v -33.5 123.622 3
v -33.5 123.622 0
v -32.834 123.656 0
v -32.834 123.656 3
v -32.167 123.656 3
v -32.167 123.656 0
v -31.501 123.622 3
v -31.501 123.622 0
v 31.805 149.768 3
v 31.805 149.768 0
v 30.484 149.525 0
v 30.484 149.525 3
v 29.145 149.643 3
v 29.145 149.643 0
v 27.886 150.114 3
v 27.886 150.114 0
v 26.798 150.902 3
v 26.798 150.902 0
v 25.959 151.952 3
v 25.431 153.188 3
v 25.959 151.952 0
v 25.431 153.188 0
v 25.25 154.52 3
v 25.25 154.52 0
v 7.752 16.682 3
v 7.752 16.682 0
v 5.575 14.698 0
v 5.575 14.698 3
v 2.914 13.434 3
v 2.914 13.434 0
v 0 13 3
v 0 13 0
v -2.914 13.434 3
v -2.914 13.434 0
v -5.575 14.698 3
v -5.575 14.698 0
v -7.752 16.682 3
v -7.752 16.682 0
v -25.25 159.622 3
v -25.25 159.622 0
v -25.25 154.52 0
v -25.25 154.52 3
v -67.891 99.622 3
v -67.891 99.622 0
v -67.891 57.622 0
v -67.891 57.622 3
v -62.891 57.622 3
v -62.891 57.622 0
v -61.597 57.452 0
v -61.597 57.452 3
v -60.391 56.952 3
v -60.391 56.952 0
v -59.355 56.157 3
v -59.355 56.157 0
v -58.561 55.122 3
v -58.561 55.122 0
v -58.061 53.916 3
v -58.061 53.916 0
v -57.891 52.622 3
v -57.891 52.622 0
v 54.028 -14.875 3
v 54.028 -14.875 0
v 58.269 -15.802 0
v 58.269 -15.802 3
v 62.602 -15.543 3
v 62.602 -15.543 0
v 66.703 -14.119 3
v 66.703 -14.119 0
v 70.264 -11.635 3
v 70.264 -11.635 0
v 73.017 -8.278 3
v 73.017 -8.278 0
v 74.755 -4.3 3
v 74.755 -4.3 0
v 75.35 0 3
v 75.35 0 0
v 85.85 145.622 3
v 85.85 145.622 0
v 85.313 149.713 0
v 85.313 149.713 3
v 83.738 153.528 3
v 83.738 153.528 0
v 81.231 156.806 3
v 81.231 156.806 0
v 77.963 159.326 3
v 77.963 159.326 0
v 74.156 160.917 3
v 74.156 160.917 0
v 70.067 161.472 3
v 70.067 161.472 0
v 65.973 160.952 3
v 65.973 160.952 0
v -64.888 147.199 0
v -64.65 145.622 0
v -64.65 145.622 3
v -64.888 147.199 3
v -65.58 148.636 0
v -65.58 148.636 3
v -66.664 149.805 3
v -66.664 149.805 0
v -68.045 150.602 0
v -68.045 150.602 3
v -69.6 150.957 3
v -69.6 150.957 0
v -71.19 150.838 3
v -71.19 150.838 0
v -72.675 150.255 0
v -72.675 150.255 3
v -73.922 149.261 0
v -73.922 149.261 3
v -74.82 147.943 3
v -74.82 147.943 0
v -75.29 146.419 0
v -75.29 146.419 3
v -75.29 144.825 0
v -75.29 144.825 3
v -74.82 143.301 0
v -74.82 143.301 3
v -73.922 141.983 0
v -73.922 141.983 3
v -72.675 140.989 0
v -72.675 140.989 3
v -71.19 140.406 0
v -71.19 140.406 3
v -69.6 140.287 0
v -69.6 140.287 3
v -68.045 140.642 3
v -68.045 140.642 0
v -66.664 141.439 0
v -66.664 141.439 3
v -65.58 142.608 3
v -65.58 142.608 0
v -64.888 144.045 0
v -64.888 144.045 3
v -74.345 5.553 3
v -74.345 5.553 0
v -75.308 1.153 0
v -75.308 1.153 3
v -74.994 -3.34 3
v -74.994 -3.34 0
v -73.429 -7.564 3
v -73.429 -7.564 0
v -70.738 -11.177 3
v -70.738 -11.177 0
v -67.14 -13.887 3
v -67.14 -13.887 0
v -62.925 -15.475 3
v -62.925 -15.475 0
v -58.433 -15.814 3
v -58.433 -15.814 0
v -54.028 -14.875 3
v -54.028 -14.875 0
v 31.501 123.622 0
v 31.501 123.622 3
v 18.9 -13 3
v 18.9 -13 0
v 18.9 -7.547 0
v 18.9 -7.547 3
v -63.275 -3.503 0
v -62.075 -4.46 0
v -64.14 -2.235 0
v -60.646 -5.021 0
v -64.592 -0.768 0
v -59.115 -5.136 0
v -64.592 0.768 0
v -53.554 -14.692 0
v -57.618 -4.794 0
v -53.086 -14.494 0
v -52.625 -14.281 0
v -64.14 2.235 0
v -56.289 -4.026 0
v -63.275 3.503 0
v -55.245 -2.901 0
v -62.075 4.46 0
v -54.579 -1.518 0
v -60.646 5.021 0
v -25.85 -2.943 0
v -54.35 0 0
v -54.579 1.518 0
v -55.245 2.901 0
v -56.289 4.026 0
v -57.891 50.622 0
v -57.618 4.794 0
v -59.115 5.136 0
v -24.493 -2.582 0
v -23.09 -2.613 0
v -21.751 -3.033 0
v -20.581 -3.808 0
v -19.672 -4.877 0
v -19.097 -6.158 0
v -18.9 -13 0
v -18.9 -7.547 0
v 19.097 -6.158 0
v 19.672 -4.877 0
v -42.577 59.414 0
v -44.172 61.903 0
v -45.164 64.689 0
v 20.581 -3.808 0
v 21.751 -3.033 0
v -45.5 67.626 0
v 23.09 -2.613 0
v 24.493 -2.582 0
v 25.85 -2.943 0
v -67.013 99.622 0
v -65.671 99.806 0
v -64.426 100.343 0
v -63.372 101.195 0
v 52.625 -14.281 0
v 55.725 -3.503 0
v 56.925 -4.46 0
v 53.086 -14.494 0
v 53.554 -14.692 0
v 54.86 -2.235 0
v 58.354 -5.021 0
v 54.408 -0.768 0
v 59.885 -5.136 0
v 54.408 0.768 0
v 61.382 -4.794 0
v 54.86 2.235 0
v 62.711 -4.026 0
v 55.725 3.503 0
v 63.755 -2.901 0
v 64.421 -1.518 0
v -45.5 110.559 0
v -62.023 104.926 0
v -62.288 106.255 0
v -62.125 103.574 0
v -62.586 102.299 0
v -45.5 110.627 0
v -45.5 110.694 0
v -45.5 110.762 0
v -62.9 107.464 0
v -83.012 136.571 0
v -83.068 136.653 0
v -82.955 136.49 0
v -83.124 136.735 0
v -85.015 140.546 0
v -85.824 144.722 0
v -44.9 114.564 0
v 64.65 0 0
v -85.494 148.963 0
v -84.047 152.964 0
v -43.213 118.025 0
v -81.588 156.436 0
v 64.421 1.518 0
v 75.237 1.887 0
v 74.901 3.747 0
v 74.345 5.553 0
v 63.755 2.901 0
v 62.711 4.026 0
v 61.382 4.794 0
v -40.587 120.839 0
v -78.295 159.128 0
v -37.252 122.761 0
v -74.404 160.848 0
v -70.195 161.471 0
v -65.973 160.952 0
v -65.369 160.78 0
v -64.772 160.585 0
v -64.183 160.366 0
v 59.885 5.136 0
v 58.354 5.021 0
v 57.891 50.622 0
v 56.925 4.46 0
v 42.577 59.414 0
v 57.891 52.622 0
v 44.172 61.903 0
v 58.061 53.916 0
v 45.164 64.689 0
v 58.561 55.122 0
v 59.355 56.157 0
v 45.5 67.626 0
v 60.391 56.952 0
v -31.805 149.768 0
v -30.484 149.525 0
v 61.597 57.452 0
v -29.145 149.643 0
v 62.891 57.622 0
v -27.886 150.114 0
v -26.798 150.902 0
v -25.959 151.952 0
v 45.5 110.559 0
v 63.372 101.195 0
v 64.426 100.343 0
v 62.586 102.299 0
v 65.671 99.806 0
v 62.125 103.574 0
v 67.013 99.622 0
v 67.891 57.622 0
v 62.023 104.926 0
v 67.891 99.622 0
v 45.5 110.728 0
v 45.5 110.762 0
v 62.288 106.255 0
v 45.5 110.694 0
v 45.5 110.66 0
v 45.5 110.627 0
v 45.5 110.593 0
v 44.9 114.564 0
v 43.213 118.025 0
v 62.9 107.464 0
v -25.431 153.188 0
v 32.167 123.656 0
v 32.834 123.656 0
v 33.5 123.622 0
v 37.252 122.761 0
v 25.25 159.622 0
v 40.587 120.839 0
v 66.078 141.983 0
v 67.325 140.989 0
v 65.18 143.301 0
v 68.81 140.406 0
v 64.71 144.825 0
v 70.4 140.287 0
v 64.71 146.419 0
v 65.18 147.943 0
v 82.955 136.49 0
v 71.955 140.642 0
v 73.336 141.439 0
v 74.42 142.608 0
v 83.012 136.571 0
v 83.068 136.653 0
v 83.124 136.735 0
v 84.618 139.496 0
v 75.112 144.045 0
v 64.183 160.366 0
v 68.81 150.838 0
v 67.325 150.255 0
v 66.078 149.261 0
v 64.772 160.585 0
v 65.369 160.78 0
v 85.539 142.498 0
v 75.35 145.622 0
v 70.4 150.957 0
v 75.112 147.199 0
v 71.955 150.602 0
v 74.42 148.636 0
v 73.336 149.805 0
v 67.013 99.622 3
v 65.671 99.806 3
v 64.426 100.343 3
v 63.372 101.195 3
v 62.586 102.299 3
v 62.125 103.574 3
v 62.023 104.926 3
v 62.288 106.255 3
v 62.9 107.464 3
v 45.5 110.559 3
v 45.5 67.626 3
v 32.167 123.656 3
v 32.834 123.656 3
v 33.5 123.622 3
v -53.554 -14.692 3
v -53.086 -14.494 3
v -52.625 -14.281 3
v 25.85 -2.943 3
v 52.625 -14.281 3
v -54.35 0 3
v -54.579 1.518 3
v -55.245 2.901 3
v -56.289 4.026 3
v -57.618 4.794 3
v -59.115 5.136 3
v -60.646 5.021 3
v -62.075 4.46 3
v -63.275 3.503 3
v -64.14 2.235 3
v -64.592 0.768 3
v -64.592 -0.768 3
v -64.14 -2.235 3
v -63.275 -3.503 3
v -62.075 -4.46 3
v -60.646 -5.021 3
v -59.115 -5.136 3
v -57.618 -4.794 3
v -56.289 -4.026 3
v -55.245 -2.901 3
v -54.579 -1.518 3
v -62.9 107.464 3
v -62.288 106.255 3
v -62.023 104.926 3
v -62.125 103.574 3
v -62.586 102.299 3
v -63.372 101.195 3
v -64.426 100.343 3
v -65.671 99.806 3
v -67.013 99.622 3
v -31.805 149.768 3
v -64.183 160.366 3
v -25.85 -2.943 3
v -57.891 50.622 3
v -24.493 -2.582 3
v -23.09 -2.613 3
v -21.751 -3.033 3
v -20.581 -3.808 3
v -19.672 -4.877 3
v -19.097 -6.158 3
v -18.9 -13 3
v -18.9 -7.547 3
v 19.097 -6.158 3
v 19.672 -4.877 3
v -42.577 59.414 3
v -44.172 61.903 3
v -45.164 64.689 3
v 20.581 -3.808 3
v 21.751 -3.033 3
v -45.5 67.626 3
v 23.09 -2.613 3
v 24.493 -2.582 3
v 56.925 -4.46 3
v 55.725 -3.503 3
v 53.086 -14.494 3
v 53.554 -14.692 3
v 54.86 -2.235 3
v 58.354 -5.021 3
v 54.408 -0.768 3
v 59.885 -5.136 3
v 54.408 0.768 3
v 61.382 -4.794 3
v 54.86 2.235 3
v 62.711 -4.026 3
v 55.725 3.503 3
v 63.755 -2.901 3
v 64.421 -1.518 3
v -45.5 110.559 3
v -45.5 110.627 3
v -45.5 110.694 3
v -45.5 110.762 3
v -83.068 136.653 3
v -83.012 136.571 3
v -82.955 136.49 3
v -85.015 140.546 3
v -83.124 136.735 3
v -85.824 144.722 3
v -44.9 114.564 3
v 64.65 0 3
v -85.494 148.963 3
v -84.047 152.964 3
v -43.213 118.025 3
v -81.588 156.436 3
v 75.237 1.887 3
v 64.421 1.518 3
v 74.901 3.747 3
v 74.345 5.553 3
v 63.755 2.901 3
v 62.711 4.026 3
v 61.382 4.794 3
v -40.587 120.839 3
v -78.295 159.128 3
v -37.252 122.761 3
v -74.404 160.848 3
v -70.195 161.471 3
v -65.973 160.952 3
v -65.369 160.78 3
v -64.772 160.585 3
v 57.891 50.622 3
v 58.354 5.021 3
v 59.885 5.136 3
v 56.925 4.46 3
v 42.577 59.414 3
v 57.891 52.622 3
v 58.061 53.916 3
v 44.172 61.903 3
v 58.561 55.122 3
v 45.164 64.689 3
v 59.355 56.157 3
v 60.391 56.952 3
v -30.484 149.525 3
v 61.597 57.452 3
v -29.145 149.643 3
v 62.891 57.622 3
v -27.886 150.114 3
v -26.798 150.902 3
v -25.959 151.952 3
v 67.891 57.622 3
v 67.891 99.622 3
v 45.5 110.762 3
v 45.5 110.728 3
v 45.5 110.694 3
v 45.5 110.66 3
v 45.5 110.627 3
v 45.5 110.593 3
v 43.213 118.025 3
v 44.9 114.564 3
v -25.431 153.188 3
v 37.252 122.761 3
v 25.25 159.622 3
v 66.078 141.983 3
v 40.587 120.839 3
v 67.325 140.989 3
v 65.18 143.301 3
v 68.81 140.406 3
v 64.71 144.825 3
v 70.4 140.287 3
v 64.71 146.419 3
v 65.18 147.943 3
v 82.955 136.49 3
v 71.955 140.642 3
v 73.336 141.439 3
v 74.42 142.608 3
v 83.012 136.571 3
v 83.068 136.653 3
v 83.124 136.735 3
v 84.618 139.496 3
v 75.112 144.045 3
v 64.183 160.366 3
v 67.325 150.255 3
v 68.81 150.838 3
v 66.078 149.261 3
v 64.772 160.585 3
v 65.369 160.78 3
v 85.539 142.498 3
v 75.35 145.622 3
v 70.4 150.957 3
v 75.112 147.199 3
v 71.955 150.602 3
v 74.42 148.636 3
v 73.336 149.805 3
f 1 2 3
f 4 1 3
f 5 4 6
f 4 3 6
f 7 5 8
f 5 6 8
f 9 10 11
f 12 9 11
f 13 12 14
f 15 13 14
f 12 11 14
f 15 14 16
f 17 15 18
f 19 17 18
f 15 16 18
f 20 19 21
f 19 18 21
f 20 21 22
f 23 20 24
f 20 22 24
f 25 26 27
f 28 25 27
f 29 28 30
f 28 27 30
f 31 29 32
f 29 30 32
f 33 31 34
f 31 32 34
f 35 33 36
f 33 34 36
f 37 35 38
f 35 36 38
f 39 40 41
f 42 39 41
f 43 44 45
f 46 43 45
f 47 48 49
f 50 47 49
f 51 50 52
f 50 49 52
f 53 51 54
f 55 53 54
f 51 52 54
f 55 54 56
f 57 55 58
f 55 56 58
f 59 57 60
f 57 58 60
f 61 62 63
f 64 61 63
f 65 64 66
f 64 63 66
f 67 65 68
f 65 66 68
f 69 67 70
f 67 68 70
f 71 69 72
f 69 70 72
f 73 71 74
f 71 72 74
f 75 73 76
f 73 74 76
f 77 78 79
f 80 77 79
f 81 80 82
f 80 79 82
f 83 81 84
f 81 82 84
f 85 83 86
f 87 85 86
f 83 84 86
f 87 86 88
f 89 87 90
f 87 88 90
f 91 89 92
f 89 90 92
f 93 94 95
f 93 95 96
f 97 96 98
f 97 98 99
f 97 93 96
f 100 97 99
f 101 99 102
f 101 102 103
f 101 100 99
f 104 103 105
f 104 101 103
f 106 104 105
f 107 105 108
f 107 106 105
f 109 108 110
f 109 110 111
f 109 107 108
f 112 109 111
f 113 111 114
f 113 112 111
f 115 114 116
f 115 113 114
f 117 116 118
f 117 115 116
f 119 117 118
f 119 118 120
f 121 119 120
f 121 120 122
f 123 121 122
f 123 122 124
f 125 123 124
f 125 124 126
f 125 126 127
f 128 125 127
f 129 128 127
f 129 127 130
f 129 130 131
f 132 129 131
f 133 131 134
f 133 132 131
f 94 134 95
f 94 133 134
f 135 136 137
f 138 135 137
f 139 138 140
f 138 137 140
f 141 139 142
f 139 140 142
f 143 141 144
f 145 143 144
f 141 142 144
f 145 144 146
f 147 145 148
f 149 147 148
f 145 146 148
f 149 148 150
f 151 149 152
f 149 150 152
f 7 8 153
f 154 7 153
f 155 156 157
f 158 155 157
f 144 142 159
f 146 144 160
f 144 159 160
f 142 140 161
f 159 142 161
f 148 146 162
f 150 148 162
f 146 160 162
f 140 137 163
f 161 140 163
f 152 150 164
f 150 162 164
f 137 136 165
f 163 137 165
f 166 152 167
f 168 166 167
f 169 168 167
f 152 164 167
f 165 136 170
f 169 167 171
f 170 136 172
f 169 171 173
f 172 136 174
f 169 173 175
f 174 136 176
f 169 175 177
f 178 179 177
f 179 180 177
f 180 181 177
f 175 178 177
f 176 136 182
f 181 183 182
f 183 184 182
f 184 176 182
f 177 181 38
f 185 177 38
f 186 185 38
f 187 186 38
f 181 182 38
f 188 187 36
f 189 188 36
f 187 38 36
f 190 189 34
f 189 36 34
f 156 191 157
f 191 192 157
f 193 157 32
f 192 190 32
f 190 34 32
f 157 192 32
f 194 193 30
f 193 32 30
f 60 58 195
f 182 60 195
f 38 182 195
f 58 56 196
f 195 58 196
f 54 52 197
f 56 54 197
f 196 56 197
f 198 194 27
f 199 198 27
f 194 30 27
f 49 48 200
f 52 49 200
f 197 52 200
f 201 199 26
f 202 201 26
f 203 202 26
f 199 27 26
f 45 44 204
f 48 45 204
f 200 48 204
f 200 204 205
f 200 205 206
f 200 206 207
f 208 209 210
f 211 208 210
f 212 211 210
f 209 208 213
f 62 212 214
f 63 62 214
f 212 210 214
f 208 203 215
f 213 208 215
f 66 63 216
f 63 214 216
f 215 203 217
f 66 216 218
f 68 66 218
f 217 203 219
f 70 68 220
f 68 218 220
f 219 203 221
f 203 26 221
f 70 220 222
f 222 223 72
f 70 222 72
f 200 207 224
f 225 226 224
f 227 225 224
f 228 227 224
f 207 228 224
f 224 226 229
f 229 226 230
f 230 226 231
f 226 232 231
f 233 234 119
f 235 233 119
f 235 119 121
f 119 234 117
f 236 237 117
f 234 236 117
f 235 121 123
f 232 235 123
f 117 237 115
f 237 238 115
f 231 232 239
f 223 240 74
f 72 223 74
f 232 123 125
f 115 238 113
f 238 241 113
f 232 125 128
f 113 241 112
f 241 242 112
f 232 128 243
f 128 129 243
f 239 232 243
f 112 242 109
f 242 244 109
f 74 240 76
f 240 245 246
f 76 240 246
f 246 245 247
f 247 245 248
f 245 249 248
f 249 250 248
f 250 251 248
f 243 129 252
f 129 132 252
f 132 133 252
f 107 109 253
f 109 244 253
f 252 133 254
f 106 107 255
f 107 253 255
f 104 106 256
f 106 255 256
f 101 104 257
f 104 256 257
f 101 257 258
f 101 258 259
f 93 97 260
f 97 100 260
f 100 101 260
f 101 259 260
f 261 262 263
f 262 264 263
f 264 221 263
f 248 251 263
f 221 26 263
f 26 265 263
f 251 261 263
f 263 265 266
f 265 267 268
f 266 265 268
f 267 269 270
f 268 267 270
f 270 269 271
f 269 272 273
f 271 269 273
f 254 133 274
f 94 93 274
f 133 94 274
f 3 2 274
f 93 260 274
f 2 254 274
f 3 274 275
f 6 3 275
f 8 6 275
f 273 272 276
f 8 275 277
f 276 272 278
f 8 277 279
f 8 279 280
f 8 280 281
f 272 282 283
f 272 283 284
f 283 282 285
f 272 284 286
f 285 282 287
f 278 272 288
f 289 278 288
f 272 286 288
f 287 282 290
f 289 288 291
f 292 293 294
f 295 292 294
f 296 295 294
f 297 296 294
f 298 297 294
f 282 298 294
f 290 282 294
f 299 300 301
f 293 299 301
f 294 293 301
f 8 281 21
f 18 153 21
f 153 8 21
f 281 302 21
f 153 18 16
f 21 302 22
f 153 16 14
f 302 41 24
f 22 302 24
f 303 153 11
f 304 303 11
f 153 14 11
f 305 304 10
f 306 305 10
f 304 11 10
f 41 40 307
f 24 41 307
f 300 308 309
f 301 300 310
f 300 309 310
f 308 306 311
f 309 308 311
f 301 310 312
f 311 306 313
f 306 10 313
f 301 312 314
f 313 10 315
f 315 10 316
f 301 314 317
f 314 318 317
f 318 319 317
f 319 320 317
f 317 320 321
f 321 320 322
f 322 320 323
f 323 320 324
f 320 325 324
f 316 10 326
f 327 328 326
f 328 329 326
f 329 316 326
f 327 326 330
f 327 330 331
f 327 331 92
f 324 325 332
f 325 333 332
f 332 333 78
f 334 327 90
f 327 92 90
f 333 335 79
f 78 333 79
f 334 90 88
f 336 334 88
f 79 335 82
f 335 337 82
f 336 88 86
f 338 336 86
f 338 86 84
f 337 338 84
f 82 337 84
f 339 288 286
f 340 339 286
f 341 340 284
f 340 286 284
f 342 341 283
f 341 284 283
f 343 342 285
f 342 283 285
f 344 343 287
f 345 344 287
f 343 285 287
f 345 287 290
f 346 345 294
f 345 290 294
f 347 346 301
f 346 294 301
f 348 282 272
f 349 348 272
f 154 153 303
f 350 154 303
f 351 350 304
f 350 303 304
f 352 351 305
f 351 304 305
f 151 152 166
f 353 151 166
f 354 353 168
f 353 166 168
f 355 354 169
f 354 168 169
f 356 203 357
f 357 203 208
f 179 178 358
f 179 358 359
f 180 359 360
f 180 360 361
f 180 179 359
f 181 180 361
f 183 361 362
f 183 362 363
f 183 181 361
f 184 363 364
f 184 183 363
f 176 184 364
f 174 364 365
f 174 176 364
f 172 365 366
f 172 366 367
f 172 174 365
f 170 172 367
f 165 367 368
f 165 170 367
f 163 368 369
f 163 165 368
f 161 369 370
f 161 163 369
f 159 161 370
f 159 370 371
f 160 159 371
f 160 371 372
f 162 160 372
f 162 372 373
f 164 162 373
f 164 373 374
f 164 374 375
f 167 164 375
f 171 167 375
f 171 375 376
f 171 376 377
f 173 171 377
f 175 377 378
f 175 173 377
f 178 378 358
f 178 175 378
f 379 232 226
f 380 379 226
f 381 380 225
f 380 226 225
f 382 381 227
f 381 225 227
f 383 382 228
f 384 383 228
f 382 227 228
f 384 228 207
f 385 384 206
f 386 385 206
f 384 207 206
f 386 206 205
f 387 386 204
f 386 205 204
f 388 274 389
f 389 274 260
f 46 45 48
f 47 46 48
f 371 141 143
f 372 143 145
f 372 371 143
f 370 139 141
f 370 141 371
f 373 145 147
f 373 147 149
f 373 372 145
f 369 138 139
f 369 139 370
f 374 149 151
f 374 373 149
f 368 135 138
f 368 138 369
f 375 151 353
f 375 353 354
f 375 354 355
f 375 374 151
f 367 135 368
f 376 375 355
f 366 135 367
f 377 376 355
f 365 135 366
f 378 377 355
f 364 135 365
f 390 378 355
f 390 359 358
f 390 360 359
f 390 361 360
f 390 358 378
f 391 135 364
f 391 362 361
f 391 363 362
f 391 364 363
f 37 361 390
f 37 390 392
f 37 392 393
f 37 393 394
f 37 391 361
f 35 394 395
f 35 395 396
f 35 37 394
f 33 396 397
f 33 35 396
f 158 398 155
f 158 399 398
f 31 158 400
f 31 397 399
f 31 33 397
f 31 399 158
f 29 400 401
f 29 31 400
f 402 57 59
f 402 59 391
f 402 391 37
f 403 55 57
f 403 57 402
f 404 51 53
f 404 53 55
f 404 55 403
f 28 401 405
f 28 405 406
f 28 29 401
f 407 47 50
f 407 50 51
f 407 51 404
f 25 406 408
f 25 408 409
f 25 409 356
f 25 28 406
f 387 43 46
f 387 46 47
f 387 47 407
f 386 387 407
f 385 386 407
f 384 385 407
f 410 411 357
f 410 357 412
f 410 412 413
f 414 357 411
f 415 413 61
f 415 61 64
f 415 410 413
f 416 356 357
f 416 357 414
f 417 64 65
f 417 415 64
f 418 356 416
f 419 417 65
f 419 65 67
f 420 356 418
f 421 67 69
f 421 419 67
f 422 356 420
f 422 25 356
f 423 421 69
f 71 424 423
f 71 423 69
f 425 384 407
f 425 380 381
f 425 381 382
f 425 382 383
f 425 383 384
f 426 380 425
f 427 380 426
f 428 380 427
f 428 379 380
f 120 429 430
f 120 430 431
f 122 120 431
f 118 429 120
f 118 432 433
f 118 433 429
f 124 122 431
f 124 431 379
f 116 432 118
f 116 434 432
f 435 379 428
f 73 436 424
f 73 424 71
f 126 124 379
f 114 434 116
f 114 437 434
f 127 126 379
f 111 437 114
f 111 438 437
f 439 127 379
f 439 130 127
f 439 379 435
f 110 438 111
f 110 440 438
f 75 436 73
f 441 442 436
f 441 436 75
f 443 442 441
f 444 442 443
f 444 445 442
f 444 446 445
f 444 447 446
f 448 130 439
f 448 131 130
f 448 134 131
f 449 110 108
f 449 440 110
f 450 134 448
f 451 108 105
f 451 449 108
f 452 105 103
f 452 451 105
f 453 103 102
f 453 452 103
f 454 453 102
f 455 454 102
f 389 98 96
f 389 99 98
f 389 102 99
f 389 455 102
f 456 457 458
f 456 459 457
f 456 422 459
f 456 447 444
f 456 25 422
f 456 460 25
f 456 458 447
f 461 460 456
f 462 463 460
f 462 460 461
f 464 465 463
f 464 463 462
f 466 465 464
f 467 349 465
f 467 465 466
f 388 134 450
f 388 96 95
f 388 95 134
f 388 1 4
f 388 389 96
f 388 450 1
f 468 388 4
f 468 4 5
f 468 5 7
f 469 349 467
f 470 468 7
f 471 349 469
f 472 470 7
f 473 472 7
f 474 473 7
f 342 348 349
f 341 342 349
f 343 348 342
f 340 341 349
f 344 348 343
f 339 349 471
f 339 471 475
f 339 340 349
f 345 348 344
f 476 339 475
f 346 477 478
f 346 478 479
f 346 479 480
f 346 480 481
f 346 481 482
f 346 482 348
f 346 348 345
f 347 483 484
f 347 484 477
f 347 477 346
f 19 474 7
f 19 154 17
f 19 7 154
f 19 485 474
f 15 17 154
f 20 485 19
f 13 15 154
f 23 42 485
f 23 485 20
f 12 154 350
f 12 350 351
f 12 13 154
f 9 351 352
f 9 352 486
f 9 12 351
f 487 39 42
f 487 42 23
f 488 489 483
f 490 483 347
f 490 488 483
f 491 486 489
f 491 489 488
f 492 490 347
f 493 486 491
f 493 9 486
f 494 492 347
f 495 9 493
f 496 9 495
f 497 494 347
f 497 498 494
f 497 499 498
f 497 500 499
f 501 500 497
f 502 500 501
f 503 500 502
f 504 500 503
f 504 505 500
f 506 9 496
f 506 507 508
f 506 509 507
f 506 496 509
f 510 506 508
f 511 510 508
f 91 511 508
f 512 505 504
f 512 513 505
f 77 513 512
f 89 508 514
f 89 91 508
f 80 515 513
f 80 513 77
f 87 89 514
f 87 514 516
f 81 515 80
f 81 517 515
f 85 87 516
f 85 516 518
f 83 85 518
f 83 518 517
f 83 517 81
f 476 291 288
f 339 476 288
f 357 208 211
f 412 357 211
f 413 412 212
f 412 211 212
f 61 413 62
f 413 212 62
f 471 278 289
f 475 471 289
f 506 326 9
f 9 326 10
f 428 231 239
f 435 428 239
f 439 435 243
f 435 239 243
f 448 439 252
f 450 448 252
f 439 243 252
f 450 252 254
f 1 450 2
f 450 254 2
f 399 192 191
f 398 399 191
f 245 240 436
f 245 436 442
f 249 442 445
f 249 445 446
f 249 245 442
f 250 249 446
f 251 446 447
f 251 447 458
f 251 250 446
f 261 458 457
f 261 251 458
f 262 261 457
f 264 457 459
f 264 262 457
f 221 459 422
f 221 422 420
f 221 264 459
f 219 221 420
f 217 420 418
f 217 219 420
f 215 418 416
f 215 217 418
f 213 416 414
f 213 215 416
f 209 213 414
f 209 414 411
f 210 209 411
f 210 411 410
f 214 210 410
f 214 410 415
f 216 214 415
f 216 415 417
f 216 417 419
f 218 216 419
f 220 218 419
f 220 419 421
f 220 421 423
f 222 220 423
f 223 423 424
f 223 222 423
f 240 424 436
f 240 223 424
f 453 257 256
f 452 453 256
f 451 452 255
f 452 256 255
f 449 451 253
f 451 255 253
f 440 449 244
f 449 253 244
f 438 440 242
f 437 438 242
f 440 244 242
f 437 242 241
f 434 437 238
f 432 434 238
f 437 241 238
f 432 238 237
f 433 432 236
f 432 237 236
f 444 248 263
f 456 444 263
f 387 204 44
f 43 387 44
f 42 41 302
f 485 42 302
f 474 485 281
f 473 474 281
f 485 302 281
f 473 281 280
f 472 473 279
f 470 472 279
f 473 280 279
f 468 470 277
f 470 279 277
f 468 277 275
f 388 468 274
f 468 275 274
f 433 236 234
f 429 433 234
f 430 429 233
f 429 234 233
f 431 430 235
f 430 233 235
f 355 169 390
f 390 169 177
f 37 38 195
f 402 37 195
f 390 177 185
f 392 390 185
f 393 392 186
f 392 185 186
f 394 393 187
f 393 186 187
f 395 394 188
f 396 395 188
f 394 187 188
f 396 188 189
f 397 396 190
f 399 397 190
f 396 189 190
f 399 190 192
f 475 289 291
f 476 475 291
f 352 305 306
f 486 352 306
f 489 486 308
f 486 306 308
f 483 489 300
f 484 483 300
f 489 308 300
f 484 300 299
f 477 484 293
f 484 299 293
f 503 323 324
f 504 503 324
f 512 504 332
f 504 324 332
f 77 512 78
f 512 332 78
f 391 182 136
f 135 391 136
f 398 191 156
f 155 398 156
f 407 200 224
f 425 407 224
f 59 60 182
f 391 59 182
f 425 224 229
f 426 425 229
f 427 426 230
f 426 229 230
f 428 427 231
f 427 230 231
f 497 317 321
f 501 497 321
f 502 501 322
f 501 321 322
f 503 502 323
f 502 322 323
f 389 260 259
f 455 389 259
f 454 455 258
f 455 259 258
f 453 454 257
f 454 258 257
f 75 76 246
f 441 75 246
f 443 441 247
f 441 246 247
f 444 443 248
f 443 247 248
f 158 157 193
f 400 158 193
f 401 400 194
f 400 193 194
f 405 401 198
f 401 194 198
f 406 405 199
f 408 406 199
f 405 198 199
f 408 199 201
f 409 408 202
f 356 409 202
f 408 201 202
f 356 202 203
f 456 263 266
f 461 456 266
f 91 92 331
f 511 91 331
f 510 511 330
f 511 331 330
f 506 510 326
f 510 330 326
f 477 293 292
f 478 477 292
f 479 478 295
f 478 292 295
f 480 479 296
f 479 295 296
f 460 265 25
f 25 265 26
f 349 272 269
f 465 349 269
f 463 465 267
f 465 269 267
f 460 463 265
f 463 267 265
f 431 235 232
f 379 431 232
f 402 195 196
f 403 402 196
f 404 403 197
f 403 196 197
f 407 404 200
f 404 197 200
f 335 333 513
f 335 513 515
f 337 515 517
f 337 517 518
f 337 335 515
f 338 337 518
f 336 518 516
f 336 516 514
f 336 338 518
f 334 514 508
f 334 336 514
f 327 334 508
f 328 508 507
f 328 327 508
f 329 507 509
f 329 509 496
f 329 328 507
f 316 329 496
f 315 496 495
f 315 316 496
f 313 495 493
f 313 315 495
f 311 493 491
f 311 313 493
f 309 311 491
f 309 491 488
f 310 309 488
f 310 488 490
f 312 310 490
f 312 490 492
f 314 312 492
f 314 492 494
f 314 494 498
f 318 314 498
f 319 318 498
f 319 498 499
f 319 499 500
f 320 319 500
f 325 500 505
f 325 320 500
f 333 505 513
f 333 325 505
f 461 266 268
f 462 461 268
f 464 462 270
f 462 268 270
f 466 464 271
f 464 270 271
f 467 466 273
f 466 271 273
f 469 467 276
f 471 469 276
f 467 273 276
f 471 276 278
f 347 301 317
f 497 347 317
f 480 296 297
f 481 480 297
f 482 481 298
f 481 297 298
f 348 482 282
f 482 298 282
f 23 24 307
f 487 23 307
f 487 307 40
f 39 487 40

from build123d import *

# Parameters (mm, degrees)
F0_R     = 5.15
F0_R_2   = 5.35
F1_DEPTH = 3


with BuildPart() as f1:
    # F0 (on Top) → F1 (new body)
    with BuildSketch(Plane.XY):
        with BuildLine():
            Line((-18.9, -13), (0, -13))
            Line((0, -13), (18.9, -13))
            Line((18.9, -13), (18.9, -7.5471567511))
            ThreePointArc((18.9, -7.5471567511), (21.1385310794, -3.3789089897), (25.8497157602, -2.9429620925))
            Line((25.8497157602, -2.9429620925), (52.6252323996, -14.2814589745))
            ThreePointArc((52.6252323996, -14.2814589745), (48.8117732228, 11.7040295779), (74.3452534861, 5.5534627876))
            Line((74.3452534861, 5.5534627876), (57.8907951768, 50.621942028))
            Line((57.8907951768, 50.621942028), (57.8907951768, 52.621942028))
            ThreePointArc((57.8907951768, 52.621942028), (59.3552612709, 56.1574759339), (62.8907951768, 57.621942028))
            Line((62.8907951768, 57.621942028), (67.8907951768, 57.621942028))
            Line((67.8907951768, 57.621942028), (67.8907951768, 99.621942028))
            Line((67.8907951768, 99.621942028), (67.0134539994, 99.621942028))
            ThreePointArc((67.0134539994, 99.621942028), (62.5856321018, 102.2993587156), (62.8998598996, 107.4641847308))
            Line((62.8998598996, 107.4641847308), (82.9549976553, 136.4901001683))
            ThreePointArc((82.9549976553, 136.4901001683), (57.5400115252, 135.8254535138), (64.1829778441, 160.3659154829))
            Line((64.1829778441, 160.3659154829), (31.8054457349, 149.7677431215))
            ThreePointArc((31.8054457349, 149.7677431215), (27.315483743, 150.4713614419), (25.25, 154.5196467995))
            Line((25.25, 154.5196467995), (25.25, 159.621942028))
            Line((25.25, 159.621942028), (0, 159.621942028))
            Line((0, 159.621942028), (-25.25, 159.621942028))
            Line((-25.25, 159.621942028), (-25.25, 154.5196467995))
            ThreePointArc((-25.25, 154.5196467995), (-27.315483743, 150.4713614419), (-31.8054457349, 149.7677431215))
            Line((-31.8054457349, 149.7677431215), (-64.1829778441, 160.3659154829))
            ThreePointArc((-64.1829778441, 160.3659154829), (-56.8961398594, 154.5388556989), (-54.15, 145.621942028))
            ThreePointArc((-54.15, 145.621942028), (-65.2101259326, 130.5130173006), (-82.9549976553, 136.4901001683))
            Line((-82.9549976553, 136.4901001683), (-62.8998598996, 107.4641847308))
            ThreePointArc((-62.8998598996, 107.4641847308), (-62.5856321018, 102.2993587156), (-67.0134539994, 99.621942028))
            Line((-67.0134539994, 99.621942028), (-67.8907951768, 99.621942028))
            Line((-67.8907951768, 99.621942028), (-67.8907951768, 57.621942028))
            Line((-67.8907951768, 57.621942028), (-62.8907951768, 57.621942028))
            ThreePointArc((-62.8907951768, 57.621942028), (-59.3552612709, 56.1574759339), (-57.8907951768, 52.621942028))
            Line((-57.8907951768, 52.621942028), (-57.8907951768, 50.621942028))
            Line((-57.8907951768, 50.621942028), (-74.3452534861, 5.5534627876))
            ThreePointArc((-74.3452534861, 5.5534627876), (-56.6781892121, 15.5967908198), (-43.65, 0))
            ThreePointArc((-43.65, 0), (-46.0800974954, -8.4337842495), (-52.6252323996, -14.2814589745))
            Line((-52.6252323996, -14.2814589745), (-25.8497157602, -2.9429620925))
            ThreePointArc((-25.8497157602, -2.9429620925), (-21.1385310794, -3.3789089897), (-18.9, -7.5471567511))
            Line((-18.9, -7.5471567511), (-18.9, -13))
        make_face()
        with BuildLine():
            Line((-31.5007925391, 123.621942028), (0, 123.621942028))
            Line((0, 123.621942028), (31.5007925391, 123.621942028))
            ThreePointArc((31.5007925391, 123.621942028), (32.5003962696, 123.6604300644), (33.5, 123.621942028))
            ThreePointArc((33.5, 123.621942028), (42.0051009072, 119.5295106115), (45.5, 110.7619330287))
            ThreePointArc((45.5, 110.7619330287), (45.5002972018, 110.7111819333), (45.5003962696, 110.6604300644))
            ThreePointArc((45.5003962696, 110.6604300644), (45.5002972018, 110.6096781955), (45.5, 110.5589271001))
            Line((45.5, 110.5589271001), (45.5, 67.6264936436))
            ThreePointArc((45.5, 67.6264936436), (44.7475202166, 63.2677956104), (42.5771925315, 59.413687139))
            Line((42.5771925315, 59.413687139), (7.7516868511, 16.6824568887))
            Line((7.7516868511, 16.6824568887), (0, 7.1710626049))
            Line((0, 7.1710626049), (-7.7516866199, 16.6824566051))
            Line((-7.7516866199, 16.6824566051), (-42.5771925315, 59.413687139))
            ThreePointArc((-42.5771925315, 59.413687139), (-44.7475202166, 63.2677956104), (-45.5, 67.6264936436))
            Line((-45.5, 67.6264936436), (-45.5, 110.5589271001))
            ThreePointArc((-45.5, 110.5589271001), (-45.5003962696, 110.6604300644), (-45.5, 110.7619330287))
            ThreePointArc((-45.5, 110.7619330287), (-42.0051009072, 119.5295106115), (-33.5, 123.621942028))
            ThreePointArc((-33.5, 123.621942028), (-32.5003962696, 123.6604300644), (-31.5007925391, 123.621942028))
        make_face(mode=Mode.SUBTRACT)
        with BuildLine():
            ThreePointArc((74.3452534861, 5.5534627876), (48.8117732228, 11.7040295779), (52.6252323996, -14.2814589745))
            Line((52.6252323996, -14.2814589745), (54.0278478598, -14.8754176733))
            Line((54.0278478598, -14.8754176733), (74.3452534861, 5.5534627876))
        make_face()
        with Locations((59.5, 0)):
            Circle(F0_R, mode=Mode.SUBTRACT)
        with BuildLine():
            Line((54.0278478598, -14.8754176733), (52.6252323996, -14.2814589745))
            ThreePointArc((52.6252323996, -14.2814589745), (53.31940104, -14.5952970678), (54.0278478598, -14.8754176733))
        make_face()
        with BuildLine():
            Line((-54.0278478598, -14.8754176733), (-52.6252323996, -14.2814589745))
            ThreePointArc((-52.6252323996, -14.2814589745), (-46.0800974954, -8.4337842495), (-43.65, 0))
            ThreePointArc((-43.65, 0), (-56.6781892121, 15.5967908198), (-74.3452534861, 5.5534627876))
            Line((-74.3452534861, 5.5534627876), (-54.0278478598, -14.8754176733))
        make_face()
        with Locations((-59.5, 0)):
            Circle(F0_R, mode=Mode.SUBTRACT)
        with BuildLine():
            ThreePointArc((-54.0278478598, -14.8754176733), (-53.31940104, -14.5952970678), (-52.6252323996, -14.2814589745))
            Line((-52.6252323996, -14.2814589745), (-54.0278478598, -14.8754176733))
        make_face()
        with BuildLine():
            Line((74.3452534861, 5.5534627876), (54.0278478598, -14.8754176733))
            ThreePointArc((54.0278478598, -14.8754176733), (68.5688722722, -12.9991559615), (75.35, 0))
            ThreePointArc((75.35, 0), (75.0967908198, 2.8218107879), (74.3452534861, 5.5534627876))
        make_face()
        with BuildLine():
            ThreePointArc((-74.3452534861, 5.5534627876), (-70.7382626073, -11.1769384703), (-54.0278478598, -14.8754176733))
            Line((-54.0278478598, -14.8754176733), (-74.3452534861, 5.5534627876))
        make_face()
        with BuildLine():
            ThreePointArc((64.1829778441, 160.3659154829), (57.5400115252, 135.8254535138), (82.9549976553, 136.4901001683))
            Line((82.9549976553, 136.4901001683), (83.1240413462, 136.7347580678))
            Line((83.1240413462, 136.7347580678), (65.9729166922, 160.9518180885))
            Line((65.9729166922, 160.9518180885), (64.1829778441, 160.3659154829))
        make_face()
        with Locations((70, 145.621942028)):
            Circle(F0_R_2, mode=Mode.SUBTRACT)
        with BuildLine():
            Line((83.1240413462, 136.7347580678), (82.9549976553, 136.4901001683))
            ThreePointArc((82.9549976553, 136.4901001683), (83.0400932966, 136.6120326601), (83.1240413462, 136.7347580678))
        make_face()
        with BuildLine():
            Line((65.9729166922, 160.9518180885), (83.1240413462, 136.7347580678))
            ThreePointArc((83.1240413462, 136.7347580678), (85.1531936459, 140.9740153578), (85.85, 145.621942028))
            ThreePointArc((85.85, 145.621942028), (79.6797011724, 158.1728736752), (65.9729166922, 160.9518180885))
        make_face()
        with BuildLine():
            ThreePointArc((65.9729166922, 160.9518180885), (65.0692370204, 160.6854766875), (64.1829778441, 160.3659154829))
            Line((64.1829778441, 160.3659154829), (65.9729166922, 160.9518180885))
        make_face()
        with BuildLine():
            ThreePointArc((-83.1240413462, 136.7347580678), (-83.0400932966, 136.6120326601), (-82.9549976553, 136.4901001683))
            Line((-82.9549976553, 136.4901001683), (-83.1240413462, 136.7347580678))
        make_face()
        with BuildLine():
            Line((-83.1240413462, 136.7347580678), (-82.9549976553, 136.4901001683))
            ThreePointArc((-82.9549976553, 136.4901001683), (-65.2101259326, 130.5130173006), (-54.15, 145.621942028))
            ThreePointArc((-54.15, 145.621942028), (-56.8961398594, 154.5388556989), (-64.1829778441, 160.3659154829))
            Line((-64.1829778441, 160.3659154829), (-65.9729166922, 160.9518180885))
            Line((-65.9729166922, 160.9518180885), (-83.1240413462, 136.7347580678))
        make_face()
        with Locations((-70, 145.621942028)):
            Circle(F0_R_2, mode=Mode.SUBTRACT)
        with BuildLine():
            ThreePointArc((-65.9729166922, 160.9518180885), (-82.9346496049, 154.7825828134), (-83.1240413462, 136.7347580678))
            Line((-83.1240413462, 136.7347580678), (-65.9729166922, 160.9518180885))
        make_face()
        with BuildLine():
            ThreePointArc((-64.1829778441, 160.3659154829), (-65.0692370204, 160.6854766875), (-65.9729166922, 160.9518180885))
            Line((-65.9729166922, 160.9518180885), (-64.1829778441, 160.3659154829))
        make_face()
        with BuildLine():
            Line((0, 7.1710626049), (7.7516868511, 16.6824568887))
            ThreePointArc((7.7516868511, 16.6824568887), (1.829e-07, 13), (-7.7516866199, 16.6824566051))
            Line((-7.7516866199, 16.6824566051), (0, 7.1710626049))
        make_face()
    extrude(amount=F1_DEPTH)


solid = f1.part
